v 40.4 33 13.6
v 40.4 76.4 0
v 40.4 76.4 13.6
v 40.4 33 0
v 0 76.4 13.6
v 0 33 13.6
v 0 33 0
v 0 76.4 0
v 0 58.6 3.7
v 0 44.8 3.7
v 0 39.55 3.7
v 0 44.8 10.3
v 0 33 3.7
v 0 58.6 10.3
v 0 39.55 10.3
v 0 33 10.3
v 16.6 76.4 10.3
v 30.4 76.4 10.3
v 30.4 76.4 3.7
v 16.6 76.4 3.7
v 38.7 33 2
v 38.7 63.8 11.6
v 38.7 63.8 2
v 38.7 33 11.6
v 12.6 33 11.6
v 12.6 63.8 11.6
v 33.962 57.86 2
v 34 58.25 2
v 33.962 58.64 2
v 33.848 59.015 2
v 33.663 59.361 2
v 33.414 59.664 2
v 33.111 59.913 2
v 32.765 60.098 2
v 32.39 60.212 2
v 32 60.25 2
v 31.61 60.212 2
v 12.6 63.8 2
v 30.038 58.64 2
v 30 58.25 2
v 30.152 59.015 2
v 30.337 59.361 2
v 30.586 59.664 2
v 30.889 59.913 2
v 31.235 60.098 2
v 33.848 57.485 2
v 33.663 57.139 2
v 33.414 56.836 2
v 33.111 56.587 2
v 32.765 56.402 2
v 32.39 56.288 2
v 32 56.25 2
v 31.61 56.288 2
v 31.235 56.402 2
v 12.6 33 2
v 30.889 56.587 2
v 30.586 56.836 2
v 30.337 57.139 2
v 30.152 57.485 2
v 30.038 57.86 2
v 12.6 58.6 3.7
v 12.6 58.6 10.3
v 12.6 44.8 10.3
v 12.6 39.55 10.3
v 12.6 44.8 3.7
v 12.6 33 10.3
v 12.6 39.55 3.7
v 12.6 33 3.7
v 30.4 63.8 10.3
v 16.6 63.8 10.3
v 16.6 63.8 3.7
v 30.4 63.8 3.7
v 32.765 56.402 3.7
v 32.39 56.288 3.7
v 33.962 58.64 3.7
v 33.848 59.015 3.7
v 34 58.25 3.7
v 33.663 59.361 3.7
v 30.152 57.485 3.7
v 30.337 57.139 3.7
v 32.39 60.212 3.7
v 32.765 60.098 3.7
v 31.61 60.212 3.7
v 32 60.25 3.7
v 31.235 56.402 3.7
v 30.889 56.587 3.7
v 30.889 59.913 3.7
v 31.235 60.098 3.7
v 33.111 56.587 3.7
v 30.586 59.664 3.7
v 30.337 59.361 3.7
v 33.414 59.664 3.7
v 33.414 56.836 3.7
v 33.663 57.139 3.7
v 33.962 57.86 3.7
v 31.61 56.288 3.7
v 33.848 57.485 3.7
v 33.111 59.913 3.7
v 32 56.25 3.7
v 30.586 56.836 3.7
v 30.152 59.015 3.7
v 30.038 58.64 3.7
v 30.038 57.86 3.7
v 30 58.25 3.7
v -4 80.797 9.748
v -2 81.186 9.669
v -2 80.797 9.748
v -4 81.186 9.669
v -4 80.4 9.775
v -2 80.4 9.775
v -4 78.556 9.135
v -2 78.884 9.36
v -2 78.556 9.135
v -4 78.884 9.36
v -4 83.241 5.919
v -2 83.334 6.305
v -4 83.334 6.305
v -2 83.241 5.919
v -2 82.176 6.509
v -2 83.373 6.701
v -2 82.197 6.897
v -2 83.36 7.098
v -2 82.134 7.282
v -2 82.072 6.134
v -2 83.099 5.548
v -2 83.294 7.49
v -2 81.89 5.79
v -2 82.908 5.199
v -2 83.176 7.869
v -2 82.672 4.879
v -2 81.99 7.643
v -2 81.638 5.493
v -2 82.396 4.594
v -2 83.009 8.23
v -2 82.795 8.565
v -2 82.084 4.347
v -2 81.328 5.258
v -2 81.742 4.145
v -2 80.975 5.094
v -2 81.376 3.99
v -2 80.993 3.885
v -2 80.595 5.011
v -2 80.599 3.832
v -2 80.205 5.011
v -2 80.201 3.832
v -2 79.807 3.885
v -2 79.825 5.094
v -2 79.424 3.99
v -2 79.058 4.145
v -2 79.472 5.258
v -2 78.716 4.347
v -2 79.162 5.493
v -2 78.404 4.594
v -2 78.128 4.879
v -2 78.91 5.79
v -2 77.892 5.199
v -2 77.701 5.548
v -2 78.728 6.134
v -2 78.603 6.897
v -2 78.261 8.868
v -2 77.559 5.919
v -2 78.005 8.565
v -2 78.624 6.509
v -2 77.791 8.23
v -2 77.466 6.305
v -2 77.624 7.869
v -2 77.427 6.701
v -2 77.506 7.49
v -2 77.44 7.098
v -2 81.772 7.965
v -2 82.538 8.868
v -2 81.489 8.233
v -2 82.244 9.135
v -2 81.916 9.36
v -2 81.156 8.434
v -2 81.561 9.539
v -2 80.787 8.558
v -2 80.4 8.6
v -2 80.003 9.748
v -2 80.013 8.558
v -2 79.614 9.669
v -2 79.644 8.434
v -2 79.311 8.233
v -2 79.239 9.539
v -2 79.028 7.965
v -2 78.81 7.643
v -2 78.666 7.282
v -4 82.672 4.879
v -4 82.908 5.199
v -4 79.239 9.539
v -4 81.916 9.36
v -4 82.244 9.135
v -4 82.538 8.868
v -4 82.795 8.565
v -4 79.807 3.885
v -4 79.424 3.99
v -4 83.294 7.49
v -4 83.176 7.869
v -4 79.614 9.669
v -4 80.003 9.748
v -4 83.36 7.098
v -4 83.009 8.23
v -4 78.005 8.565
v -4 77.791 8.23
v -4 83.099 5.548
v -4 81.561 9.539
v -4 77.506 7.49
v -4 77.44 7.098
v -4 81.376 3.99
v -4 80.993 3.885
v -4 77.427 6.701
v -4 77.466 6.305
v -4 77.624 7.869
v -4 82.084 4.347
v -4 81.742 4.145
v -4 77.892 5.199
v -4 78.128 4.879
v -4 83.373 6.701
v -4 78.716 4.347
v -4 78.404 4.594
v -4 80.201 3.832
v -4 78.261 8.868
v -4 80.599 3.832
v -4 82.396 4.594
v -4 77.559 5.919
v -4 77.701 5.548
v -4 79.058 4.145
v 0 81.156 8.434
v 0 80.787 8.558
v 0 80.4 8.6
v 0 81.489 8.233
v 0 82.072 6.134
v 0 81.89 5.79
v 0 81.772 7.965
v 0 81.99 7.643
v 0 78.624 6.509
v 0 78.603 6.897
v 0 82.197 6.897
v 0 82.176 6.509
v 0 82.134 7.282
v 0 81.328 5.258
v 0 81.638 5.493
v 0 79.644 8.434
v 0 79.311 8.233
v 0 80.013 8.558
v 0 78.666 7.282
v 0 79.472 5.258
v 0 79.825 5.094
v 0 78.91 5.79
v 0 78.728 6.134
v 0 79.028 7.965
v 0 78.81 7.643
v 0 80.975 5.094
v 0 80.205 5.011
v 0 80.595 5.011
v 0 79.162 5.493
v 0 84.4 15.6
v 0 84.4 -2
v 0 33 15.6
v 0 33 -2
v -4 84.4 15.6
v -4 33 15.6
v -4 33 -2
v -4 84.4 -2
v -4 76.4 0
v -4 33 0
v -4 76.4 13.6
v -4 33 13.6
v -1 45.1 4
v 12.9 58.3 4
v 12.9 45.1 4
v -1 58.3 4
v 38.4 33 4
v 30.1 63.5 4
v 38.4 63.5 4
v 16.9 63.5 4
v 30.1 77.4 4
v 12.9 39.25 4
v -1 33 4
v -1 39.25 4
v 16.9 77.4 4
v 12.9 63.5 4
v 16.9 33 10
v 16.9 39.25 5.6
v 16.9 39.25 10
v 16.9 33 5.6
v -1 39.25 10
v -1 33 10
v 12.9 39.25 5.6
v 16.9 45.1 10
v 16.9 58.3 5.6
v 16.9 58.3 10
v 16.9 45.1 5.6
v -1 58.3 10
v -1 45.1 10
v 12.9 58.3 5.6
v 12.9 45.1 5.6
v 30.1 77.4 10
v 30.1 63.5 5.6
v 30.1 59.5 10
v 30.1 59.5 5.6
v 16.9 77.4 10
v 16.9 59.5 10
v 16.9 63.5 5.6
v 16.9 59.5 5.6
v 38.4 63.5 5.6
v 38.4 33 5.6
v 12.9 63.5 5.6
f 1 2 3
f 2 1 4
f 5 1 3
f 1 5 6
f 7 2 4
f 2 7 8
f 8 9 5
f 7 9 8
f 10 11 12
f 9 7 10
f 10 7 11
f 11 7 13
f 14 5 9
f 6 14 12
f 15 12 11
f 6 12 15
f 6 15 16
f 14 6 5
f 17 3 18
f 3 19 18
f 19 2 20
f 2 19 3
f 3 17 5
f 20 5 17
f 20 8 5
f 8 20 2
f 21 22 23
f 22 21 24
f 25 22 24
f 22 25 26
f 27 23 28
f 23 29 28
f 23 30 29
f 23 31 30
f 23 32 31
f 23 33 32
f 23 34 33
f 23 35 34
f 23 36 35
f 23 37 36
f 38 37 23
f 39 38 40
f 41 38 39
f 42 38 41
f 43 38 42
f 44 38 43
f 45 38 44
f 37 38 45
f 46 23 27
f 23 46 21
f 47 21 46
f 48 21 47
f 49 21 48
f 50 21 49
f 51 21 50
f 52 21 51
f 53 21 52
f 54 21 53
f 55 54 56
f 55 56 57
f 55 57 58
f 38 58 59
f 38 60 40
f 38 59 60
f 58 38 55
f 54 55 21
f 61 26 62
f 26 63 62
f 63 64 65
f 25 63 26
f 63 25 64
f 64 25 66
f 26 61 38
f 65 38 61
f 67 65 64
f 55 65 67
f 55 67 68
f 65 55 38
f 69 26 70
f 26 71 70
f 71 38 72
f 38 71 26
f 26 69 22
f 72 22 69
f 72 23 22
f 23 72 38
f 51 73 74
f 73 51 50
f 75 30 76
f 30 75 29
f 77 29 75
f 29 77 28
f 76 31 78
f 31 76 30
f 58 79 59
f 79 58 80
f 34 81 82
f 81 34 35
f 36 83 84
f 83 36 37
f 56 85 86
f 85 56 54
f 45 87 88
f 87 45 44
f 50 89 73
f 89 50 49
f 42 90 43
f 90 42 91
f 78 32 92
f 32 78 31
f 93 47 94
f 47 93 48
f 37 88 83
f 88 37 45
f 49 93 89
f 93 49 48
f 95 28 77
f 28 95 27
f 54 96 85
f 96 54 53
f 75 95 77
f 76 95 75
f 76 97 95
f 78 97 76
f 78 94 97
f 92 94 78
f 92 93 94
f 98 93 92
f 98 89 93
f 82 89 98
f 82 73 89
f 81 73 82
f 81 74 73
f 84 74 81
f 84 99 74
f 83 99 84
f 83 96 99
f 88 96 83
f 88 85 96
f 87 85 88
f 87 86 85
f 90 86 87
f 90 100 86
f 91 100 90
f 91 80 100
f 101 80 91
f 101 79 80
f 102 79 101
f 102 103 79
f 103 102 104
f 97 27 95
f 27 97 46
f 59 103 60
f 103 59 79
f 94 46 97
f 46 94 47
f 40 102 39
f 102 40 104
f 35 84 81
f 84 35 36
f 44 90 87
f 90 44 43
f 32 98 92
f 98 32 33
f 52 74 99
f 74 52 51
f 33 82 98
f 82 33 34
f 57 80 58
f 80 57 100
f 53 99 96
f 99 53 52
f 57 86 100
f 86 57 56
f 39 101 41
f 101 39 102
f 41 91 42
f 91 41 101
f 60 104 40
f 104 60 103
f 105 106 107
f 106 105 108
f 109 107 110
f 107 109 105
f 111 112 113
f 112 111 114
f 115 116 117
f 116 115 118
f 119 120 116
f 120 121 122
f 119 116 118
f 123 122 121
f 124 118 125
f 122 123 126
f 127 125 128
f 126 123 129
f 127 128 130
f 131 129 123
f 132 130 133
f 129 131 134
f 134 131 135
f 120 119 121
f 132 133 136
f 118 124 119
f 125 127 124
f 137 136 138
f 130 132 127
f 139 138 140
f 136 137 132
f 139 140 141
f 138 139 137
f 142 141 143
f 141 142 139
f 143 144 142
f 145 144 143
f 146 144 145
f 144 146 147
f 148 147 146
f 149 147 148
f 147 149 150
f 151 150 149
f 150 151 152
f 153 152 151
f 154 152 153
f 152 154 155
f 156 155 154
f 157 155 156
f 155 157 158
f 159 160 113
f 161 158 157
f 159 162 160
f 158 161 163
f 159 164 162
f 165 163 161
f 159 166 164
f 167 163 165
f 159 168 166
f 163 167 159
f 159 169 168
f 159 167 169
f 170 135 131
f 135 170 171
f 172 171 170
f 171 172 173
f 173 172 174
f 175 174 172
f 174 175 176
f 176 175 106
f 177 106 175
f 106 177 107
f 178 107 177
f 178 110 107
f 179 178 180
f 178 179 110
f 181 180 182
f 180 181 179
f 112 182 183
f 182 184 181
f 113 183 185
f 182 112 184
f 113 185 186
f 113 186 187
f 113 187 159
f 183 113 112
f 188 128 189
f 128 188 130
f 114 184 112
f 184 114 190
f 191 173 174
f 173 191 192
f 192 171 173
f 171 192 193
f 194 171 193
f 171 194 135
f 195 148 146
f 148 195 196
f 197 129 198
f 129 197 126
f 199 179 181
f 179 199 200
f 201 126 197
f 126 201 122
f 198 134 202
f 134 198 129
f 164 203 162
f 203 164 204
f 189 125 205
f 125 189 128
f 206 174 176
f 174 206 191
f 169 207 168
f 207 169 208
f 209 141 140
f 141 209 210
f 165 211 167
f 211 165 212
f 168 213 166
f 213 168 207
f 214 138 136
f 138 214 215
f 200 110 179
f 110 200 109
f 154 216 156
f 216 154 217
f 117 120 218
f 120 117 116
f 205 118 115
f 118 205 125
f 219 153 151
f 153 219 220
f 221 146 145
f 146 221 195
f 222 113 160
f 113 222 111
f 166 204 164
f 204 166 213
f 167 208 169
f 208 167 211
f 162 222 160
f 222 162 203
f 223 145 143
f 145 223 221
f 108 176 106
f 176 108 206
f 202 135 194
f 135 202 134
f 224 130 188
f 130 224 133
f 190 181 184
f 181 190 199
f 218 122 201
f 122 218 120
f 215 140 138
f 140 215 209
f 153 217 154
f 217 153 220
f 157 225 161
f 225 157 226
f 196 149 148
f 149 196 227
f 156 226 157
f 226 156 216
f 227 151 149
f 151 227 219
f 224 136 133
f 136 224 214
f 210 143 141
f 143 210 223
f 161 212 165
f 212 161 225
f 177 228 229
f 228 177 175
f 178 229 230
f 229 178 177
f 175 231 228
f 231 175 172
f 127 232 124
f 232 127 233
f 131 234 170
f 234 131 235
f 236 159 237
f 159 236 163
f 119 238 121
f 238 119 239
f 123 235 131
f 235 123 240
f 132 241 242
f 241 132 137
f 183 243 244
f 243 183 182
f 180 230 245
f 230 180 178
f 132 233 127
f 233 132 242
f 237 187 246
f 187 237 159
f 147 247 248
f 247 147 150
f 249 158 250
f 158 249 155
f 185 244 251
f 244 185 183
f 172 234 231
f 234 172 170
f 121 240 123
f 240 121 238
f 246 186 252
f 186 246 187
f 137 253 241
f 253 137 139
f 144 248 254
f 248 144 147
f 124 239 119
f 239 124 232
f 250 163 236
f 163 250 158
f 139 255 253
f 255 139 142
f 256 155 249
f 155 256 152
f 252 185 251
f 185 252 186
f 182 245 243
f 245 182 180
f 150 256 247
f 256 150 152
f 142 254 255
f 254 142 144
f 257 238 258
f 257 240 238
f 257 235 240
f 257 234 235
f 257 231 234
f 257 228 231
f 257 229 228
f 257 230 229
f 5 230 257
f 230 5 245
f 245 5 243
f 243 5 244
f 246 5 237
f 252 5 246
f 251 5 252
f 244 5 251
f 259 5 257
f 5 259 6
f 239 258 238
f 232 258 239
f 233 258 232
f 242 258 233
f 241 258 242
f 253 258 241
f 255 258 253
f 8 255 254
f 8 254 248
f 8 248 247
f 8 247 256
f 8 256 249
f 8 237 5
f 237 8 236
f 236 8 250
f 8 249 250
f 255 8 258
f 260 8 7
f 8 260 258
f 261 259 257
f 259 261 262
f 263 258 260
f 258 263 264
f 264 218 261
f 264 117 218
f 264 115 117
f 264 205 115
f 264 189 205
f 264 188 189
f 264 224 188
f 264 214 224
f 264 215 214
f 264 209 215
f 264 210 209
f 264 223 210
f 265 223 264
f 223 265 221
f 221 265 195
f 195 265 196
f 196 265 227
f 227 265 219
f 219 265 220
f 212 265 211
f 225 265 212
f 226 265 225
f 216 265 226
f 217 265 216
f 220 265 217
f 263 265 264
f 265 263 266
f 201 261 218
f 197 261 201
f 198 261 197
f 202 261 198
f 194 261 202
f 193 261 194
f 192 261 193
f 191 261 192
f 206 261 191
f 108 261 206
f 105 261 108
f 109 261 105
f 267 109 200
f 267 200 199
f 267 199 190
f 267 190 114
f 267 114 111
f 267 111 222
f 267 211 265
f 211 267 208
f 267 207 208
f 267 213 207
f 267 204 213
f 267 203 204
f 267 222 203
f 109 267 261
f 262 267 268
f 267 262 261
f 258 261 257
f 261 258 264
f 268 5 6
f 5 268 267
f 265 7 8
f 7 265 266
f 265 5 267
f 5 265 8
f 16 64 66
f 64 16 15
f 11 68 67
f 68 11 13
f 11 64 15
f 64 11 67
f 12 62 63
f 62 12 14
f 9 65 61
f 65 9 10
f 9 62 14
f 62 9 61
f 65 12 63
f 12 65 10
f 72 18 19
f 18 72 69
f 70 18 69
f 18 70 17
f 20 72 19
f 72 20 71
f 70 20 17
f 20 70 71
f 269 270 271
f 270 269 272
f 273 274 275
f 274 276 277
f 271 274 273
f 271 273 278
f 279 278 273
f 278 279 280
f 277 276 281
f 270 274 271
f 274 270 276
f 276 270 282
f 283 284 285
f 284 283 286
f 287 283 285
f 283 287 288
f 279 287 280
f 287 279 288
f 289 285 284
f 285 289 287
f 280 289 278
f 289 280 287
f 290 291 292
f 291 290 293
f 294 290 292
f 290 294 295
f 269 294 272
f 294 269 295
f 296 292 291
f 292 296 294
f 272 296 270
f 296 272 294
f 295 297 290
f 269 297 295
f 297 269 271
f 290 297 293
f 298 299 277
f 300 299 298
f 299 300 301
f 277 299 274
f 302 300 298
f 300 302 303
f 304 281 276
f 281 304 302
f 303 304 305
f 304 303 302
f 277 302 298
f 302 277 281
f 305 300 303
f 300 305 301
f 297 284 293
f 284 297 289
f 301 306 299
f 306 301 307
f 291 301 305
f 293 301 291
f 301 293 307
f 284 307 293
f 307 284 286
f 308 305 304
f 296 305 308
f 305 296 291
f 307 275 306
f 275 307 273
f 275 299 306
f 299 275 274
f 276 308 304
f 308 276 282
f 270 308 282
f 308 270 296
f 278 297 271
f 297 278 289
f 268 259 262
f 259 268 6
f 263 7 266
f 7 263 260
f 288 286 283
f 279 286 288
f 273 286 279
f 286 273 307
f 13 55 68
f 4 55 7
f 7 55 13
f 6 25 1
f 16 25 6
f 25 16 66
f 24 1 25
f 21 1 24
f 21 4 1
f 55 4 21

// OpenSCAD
// file: hardware.scad
include <parameters.scad>

// Negative solid for a cylindrical-head (counterbore) screw.
// Origin = the surface the head sits flush with; the hole descends in -z.
// The thread shaft exits the bottom (through-hole), with a small overshoot
// on both ends so no cut face sits coincident with a surface.
module screw_hole(head_depth, head_diameter, thread_length, thread_diameter) {
  // head counterbore (breaks the top surface)
  translate([0, 0, -head_depth])
    cylinder(h=head_depth + eps, r=head_diameter / 2 + tolerance);

  // thread clearance shaft (overlaps the head, exits the bottom)
  translate([0, 0, -(head_depth + thread_length) - eps])
    cylinder(h=thread_length + (eps * 2), r=thread_diameter / 2 + tolerance);
}
// file: parameters.scad
// ============================================================
// Global rendering
// ============================================================
// Facet quality (global). $fs holds constant surface smoothness across sizes;
// $fa caps facet count on large radii. OpenSCAD uses whichever yields more.
$fa = 1;
$fs = 0.4;

eps = 0.01;

// Fit clearance applied to mating parts.
tolerance = 0.3;

// ============================================================
// Case
// ============================================================

case_split_z = 20;
case_bottom_lip_width = 2;

// This is the depth that sticks out from the top of the bottom half of the case
case_bottom_lip_depth = 2;

case_screw_mount_diameter = 15;
case_screw_mount_width = 30;
case_screw_mount_height = 15;
case_screw_mount_spacing = 11;

// Planning on using M3x8 screws
case_screw_head_depth = 30;
case_screw_head_diameter = 5.35;
case_screw_thread_diameter = 3;
case_screw_thread_length = 8;
case_screw_spacing = 4;

// ============================================================
// Wedge (front-to-back taper)
// ============================================================
wedge_angle = 2;
wedge_slope = tan(wedge_angle);

// inverse the vector, divide by the norm (actual length) inversed vector.
// norm is NOT the normalization, it gets the actual length of the vector,
// and normalizing is dividing a vector by it's length.
wedge_normal = [0, -wedge_slope, 1] / norm([0, -wedge_slope, 1]);

// ============================================================
// Threaded inserts
// ============================================================
threaded_insert_diameter = 5;
threaded_insert_depth = 6;
threaded_insert_vertical_spacing = 2;
threaded_insert_post_diameter = threaded_insert_diameter + 5;

// ============================================================
// Walls
// ============================================================
wall_depth = 5;
top_and_bottom_wall_depth = 3.5;

// ============================================================
// Base dimensions (independent)
// Interior and exterior interconnect, so base values come first,
// then the derived values below.
// ============================================================
exterior_width = 255;
exterior_height = 211;
interior_depth = 28;

// ============================================================
// Derived dimensions
// ============================================================
// Interior <- exterior width/height
interior_width = exterior_width - (wall_depth * 2);
interior_height = exterior_height - (wall_depth * 2);
interior_front_depth = interior_depth;
interior_back_depth = (exterior_height * tan(wedge_angle)) + interior_front_depth;

// Exterior depth <- interior_depth
exterior_front_depth = interior_depth + (top_and_bottom_wall_depth * 2);
exterior_back_depth = (exterior_height * tan(wedge_angle)) + exterior_front_depth;

// ============================================================
// Keyboard
// ============================================================
keyboard_width = 230;
keyboard_height = 78;

keyboard_x = (exterior_width / 2) - (keyboard_width / 2) - wall_depth;
keyboard_y = 20;

// ============================================================
// Battery
// ============================================================
battery_pack_width = 87;
battery_pack_height = 63.65;

battery_x = interior_width - (battery_pack_width) - 23;
battery_y = interior_height - (battery_pack_height) - 17;

battery_pack_cover_width = battery_pack_width + 6;
battery_pack_cover_height = battery_pack_height + 6;

// ============================================================
// Screen
// ============================================================
screen_width = 84;
screen_height = 84;

// This is the depth of the screen + Pi
// Called it _to_mount because this is the amount of space from the top of the case to the mount posts
screen_depth_to_mount = 24.80;

screen_x = 25;
screen_y = interior_height - (screen_height) - 7;

screen_screw_thread_diameter = 2.5;
screen_screw_head_diameter = 4;
screen_screw_washer_diameter = 5;
screen_screw_thread_length = 8;

// This should include the washer depth as well
screen_screw_head_depth = 3.85;

// ============================================================
// Hub
// ============================================================

hub_board_height = 61.45;
hub_board_width = 25.40;
hub_usb_port_width = 13.25;
hub_usb_port_depth = 6;
hub_usb_port_length = 10;

hub_usb_port_mount_height = 7.5;
hub_usb_port_cutout_depth = 10;
// main file
include <parameters.scad>
include <hardware.scad>

/* [Cutaway] */

// Slice the model open to see the interior
show_cutaway = true;
// Axis the cut plane is perpendicular to
cutaway_axis = "y"; // [x, y, z]
// Where the cut plane sits along that axis
cutaway_at = 33; // [-5:0.5:70]
// Keep the side with the larger coordinate rather than the smaller
cutaway_keep_above = true;

/* [Dimensions] */

// The amount of space between the bottom of the PCB and the bottom of the interior of the case
usb_case_bottom_interior_depth = 2;
usb_case_top_interior_depth = 6;

usb_pcb_depth = 1.6;
usb_pcb_width = 25.5;
usb_pcb_height = 61.5;

// These are relative to the inside of the case
usb_pcb_bottom_mount_positions = [
  [11.4, 4 + tolerance],
  [21.1, usb_pcb_height - 3.25],
];
usb_pcb_bottom_mount_size = 4;

usb_cutout_pos = 16.5;
usb_x_cutout_depth = 9;
usb_y_cutout_depth = 15;

// This is the amount of overlap between the USB port and the PCB cutout
usb_port_overlap = 4;
// This is the depth of the USB port from the front lip of the port to the back of the port
usb_port_interior_length = 12.85;
usb_port_length = 13.9;
usb_port_width = 13.2;
usb_port_depth = 6;
usb_port_gap = 5.85;
usb_port_lip = 1;

usb_case_wall_depth = 2;
usb_case_width = usb_pcb_width + (usb_case_wall_depth * 2);
usb_case_height = usb_pcb_height + (usb_case_wall_depth * 2);
usb_case_depth = usb_pcb_depth + usb_case_bottom_interior_depth + usb_case_top_interior_depth + (usb_case_wall_depth * 2);

// How far the case runs past its normal wall to shroud the ports. The case
// face stops where the port's flare begins, so every port sits proud by
// usb_port_lip. Same on both port faces, so they can't drift apart.
usb_port_shroud_depth = usb_port_length - usb_case_wall_depth - usb_port_lip;

// The case's outer y run, shroud included. The lip window and the deck hole both
// key off this, so they can't disagree about how big the case is.
usb_case_outer_height = usb_case_height + usb_port_shroud_depth;

// Stop lip. Bears on the *outer* face of the cyberdeck wall, so the hub drops
// in from outside and can go no deeper. Two screws through the y ears hold it
// both ways; a bracket inside the deck takes the z load.
usb_case_lip_depth = 4;
// Asymmetric on purpose: the y ears carry the screws, z stays thin to keep the
// hub's vertical profile down.
usb_case_lip_overhang_y = 8;
usb_case_lip_overhang_z = 2;
// M3x8, same hardware as case_screw_* in parameters.scad. screw_hole adds
// tolerance to both radii itself, so these stay nominal.
usb_case_lip_screw_head_diameter = 5.35;
usb_case_lip_screw_thread_diameter = 3;
// Counterbore depth. Stops short of usb_case_lip_depth so there is material left
// behind the head to pull against.
usb_case_lip_screw_head_depth = 2;
// Screw center, measured outboard from the case's y faces
usb_case_lip_screw_inset = 4;

// ============================================================
// Cutaway
// ============================================================
// Cutaway
// ============================================================
// A cut is described as a plane, not as a box: pick an axis, pick where along
// it to slice, pick which side to keep. `reach` is the size of the discarded
// solid and only has to overshoot the model, so nothing needs hand-tuning.
module cutaway(axis = cutaway_axis, at = cutaway_at, keep_above = cutaway_keep_above, enabled = show_cutaway, reach = 500) {
  // Fail loudly on a bad axis. Without this a typo is silent: "Y" falls
  // through the lookup below and cuts z, giving wrong geometry, not an error.
  assert(axis == "x" || axis == "y" || axis == "z", str("cutaway: bad axis '", axis, "'"));

  i = axis == "x" ? 0 : axis == "y" ? 1 : 2;

  // On the cut axis the discarded solid starts at the plane and runs away from
  // the side being kept; on the other two it is centered so it spans the model.
  origin = [for (k = [0:2]) k == i ? (keep_above ? at - reach : at) : -reach / 2];

  difference() {
    children();

    if (enabled)
      translate(origin) cube(reach);
  }
}

// Where the board sits inside the case. Shared by the drawn PCB, the port
// cutouts, the interior pocket and the mount posts so they can't drift apart
// when a dimension changes. The case's left face is x = 0 and its front face is
// y = 0, so the -x shroud pushes the board inboard by usb_port_shroud_depth.
pcb_pos = [
  usb_port_shroud_depth + usb_case_wall_depth,
  usb_case_wall_depth,
  usb_case_wall_depth + usb_case_bottom_interior_depth,
];

// Every USB port, in PCB coordinates. `t` is grown clearance: 0 draws the real
// connectors, tolerance draws the pocket they sit in. One definition, so a port
// can't be added without its cutout following along.
module usb_ports(t = 0) {
  // Three side ports, facing -x. Clearance is applied on the -x face too, so
  // the pocket keeps clearing the front slab even if usb_port_lip changes.
  for (i = [0:2])
    translate([-usb_port_length - t, 5 + i * (usb_port_width + usb_port_gap) - t, -t])
      cube([usb_port_length + usb_port_overlap + (t * 2), usb_port_width + (t * 2), usb_port_depth + (t * 2)]);

  // One port on the far edge, facing +y.
  translate([usb_port_overlap - t, usb_pcb_height - usb_port_overlap - t, -t])
    cube([usb_port_width + (t * 2), usb_port_length + usb_port_overlap + (t * 2), usb_port_depth + (t * 2)]);
}

module pcb() {
  color("chocolate")
    linear_extrude(height=usb_pcb_depth)
      difference() {
        square([usb_pcb_width, usb_pcb_height]);

        translate([usb_cutout_pos, -eps, -eps]) square([usb_x_cutout_depth + eps, usb_y_cutout_depth]);
      }

  color("silver") usb_ports();
}

// The stop lip: a collar standing proud of the case's -x face. Its window is the
// case footprint, so the deck hole only has to clear the body — the collar itself
// lands on the deck's outer face and the ports sit recessed inside the pocket.
module usb_case_lip() {
  difference() {
    translate([-usb_case_lip_depth, -usb_case_lip_overhang_y, -usb_case_lip_overhang_z])
      cube(
        [
          usb_case_lip_depth,
          usb_case_outer_height + (usb_case_lip_overhang_y * 2),
          usb_case_depth + (usb_case_lip_overhang_z * 2),
        ]
      );

    // The window. Its floor is the case's own -x wall, so the ports end up
    // recessed by usb_case_lip_depth - usb_port_lip.
    translate([-usb_case_lip_depth - eps, 0, 0])
      cube([usb_case_lip_depth + (eps * 2), usb_case_outer_height, usb_case_depth]);

    // One screw per y ear, centered on the case depth. screw_hole descends in
    // -z from the face the head sits flush with, so the origin goes on the lip's
    // outer face and -90 about y aims the hole inboard, along +x. The thread runs
    // out whatever the counterbore leaves, making it a through-hole.
    for (y = [-usb_case_lip_screw_inset, usb_case_outer_height + usb_case_lip_screw_inset])
      translate([-usb_case_lip_depth, y, usb_case_depth / 2])
        rotate([0, -90, 0])
          screw_hole(
            head_depth=usb_case_lip_screw_head_depth,
            head_diameter=usb_case_lip_screw_head_diameter,
            thread_length=usb_case_lip_depth - usb_case_lip_screw_head_depth,
            thread_diameter=usb_case_lip_screw_thread_diameter
          );
  }
}

module usb_case() {
  difference() {
    color("steelblue") {
      difference() {
        cube(
          [
            usb_port_shroud_depth + usb_case_width,
            usb_case_outer_height,
            usb_case_depth,
          ]
        );

        // The board footprint plus slop, taken straight off the board position
        // so the pocket follows the board.
        translate([pcb_pos[0] - tolerance, pcb_pos[1] - tolerance, usb_case_wall_depth])
          cube([usb_pcb_width + (tolerance * 2), usb_pcb_height + (tolerance * 2), usb_case_depth - (usb_case_wall_depth * 2)]);
      }

      // Bottom mount posts
      for (pos = usb_pcb_bottom_mount_positions)
        translate(
          [
            pcb_pos[0] + pos[0] - usb_pcb_bottom_mount_size / 2,
            pcb_pos[1] + pos[1] - usb_pcb_bottom_mount_size / 2,
            usb_case_wall_depth,
          ]
        )
          cylinder(h=usb_case_bottom_interior_depth - tolerance, r=usb_pcb_bottom_mount_size / 2);

      usb_case_lip();
    }

    translate(pcb_pos) usb_ports(tolerance);
  }
}

cutaway() {
  usb_case();
  translate(pcb_pos) pcb();
}

echo("Case depth: ", usb_case_depth);
echo("Deck hole (y x z): ", usb_case_outer_height, usb_case_depth);
echo(
  "Lip outer (y x z): ",
  usb_case_outer_height + (usb_case_lip_overhang_y * 2),
  usb_case_depth + (usb_case_lip_overhang_z * 2)
);
